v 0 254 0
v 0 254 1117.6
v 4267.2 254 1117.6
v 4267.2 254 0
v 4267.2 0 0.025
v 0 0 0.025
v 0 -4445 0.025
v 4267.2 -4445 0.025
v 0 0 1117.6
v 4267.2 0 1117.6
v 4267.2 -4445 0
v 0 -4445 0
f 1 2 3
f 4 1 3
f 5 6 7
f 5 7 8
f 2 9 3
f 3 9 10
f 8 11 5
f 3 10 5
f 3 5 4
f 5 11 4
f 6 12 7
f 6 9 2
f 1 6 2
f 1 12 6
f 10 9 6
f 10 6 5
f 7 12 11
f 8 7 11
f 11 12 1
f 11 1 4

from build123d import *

# Parameters (mm, degrees)
F0_W     = 4267.2
F0_H     = 1117.6
F1_DEPTH = 254
F2_W     = 4267.2
F2_H     = 4445
F3_DEPTH = 0.0254


with BuildPart() as f1:
    # F0 (on Front) → F1 (new body)
    with BuildSketch(Plane.XZ):
        with Locations((2133.6, 558.8)):
            Rectangle(F0_W, F0_H)
    extrude(amount=-F1_DEPTH)

    # F2 (on Top) → F3 (join)
    with BuildSketch(Plane.XY):
        with Locations((2133.6, -2222.5)):
            Rectangle(F2_W, F2_H)
    extrude(amount=F3_DEPTH)


solid = f1.part
